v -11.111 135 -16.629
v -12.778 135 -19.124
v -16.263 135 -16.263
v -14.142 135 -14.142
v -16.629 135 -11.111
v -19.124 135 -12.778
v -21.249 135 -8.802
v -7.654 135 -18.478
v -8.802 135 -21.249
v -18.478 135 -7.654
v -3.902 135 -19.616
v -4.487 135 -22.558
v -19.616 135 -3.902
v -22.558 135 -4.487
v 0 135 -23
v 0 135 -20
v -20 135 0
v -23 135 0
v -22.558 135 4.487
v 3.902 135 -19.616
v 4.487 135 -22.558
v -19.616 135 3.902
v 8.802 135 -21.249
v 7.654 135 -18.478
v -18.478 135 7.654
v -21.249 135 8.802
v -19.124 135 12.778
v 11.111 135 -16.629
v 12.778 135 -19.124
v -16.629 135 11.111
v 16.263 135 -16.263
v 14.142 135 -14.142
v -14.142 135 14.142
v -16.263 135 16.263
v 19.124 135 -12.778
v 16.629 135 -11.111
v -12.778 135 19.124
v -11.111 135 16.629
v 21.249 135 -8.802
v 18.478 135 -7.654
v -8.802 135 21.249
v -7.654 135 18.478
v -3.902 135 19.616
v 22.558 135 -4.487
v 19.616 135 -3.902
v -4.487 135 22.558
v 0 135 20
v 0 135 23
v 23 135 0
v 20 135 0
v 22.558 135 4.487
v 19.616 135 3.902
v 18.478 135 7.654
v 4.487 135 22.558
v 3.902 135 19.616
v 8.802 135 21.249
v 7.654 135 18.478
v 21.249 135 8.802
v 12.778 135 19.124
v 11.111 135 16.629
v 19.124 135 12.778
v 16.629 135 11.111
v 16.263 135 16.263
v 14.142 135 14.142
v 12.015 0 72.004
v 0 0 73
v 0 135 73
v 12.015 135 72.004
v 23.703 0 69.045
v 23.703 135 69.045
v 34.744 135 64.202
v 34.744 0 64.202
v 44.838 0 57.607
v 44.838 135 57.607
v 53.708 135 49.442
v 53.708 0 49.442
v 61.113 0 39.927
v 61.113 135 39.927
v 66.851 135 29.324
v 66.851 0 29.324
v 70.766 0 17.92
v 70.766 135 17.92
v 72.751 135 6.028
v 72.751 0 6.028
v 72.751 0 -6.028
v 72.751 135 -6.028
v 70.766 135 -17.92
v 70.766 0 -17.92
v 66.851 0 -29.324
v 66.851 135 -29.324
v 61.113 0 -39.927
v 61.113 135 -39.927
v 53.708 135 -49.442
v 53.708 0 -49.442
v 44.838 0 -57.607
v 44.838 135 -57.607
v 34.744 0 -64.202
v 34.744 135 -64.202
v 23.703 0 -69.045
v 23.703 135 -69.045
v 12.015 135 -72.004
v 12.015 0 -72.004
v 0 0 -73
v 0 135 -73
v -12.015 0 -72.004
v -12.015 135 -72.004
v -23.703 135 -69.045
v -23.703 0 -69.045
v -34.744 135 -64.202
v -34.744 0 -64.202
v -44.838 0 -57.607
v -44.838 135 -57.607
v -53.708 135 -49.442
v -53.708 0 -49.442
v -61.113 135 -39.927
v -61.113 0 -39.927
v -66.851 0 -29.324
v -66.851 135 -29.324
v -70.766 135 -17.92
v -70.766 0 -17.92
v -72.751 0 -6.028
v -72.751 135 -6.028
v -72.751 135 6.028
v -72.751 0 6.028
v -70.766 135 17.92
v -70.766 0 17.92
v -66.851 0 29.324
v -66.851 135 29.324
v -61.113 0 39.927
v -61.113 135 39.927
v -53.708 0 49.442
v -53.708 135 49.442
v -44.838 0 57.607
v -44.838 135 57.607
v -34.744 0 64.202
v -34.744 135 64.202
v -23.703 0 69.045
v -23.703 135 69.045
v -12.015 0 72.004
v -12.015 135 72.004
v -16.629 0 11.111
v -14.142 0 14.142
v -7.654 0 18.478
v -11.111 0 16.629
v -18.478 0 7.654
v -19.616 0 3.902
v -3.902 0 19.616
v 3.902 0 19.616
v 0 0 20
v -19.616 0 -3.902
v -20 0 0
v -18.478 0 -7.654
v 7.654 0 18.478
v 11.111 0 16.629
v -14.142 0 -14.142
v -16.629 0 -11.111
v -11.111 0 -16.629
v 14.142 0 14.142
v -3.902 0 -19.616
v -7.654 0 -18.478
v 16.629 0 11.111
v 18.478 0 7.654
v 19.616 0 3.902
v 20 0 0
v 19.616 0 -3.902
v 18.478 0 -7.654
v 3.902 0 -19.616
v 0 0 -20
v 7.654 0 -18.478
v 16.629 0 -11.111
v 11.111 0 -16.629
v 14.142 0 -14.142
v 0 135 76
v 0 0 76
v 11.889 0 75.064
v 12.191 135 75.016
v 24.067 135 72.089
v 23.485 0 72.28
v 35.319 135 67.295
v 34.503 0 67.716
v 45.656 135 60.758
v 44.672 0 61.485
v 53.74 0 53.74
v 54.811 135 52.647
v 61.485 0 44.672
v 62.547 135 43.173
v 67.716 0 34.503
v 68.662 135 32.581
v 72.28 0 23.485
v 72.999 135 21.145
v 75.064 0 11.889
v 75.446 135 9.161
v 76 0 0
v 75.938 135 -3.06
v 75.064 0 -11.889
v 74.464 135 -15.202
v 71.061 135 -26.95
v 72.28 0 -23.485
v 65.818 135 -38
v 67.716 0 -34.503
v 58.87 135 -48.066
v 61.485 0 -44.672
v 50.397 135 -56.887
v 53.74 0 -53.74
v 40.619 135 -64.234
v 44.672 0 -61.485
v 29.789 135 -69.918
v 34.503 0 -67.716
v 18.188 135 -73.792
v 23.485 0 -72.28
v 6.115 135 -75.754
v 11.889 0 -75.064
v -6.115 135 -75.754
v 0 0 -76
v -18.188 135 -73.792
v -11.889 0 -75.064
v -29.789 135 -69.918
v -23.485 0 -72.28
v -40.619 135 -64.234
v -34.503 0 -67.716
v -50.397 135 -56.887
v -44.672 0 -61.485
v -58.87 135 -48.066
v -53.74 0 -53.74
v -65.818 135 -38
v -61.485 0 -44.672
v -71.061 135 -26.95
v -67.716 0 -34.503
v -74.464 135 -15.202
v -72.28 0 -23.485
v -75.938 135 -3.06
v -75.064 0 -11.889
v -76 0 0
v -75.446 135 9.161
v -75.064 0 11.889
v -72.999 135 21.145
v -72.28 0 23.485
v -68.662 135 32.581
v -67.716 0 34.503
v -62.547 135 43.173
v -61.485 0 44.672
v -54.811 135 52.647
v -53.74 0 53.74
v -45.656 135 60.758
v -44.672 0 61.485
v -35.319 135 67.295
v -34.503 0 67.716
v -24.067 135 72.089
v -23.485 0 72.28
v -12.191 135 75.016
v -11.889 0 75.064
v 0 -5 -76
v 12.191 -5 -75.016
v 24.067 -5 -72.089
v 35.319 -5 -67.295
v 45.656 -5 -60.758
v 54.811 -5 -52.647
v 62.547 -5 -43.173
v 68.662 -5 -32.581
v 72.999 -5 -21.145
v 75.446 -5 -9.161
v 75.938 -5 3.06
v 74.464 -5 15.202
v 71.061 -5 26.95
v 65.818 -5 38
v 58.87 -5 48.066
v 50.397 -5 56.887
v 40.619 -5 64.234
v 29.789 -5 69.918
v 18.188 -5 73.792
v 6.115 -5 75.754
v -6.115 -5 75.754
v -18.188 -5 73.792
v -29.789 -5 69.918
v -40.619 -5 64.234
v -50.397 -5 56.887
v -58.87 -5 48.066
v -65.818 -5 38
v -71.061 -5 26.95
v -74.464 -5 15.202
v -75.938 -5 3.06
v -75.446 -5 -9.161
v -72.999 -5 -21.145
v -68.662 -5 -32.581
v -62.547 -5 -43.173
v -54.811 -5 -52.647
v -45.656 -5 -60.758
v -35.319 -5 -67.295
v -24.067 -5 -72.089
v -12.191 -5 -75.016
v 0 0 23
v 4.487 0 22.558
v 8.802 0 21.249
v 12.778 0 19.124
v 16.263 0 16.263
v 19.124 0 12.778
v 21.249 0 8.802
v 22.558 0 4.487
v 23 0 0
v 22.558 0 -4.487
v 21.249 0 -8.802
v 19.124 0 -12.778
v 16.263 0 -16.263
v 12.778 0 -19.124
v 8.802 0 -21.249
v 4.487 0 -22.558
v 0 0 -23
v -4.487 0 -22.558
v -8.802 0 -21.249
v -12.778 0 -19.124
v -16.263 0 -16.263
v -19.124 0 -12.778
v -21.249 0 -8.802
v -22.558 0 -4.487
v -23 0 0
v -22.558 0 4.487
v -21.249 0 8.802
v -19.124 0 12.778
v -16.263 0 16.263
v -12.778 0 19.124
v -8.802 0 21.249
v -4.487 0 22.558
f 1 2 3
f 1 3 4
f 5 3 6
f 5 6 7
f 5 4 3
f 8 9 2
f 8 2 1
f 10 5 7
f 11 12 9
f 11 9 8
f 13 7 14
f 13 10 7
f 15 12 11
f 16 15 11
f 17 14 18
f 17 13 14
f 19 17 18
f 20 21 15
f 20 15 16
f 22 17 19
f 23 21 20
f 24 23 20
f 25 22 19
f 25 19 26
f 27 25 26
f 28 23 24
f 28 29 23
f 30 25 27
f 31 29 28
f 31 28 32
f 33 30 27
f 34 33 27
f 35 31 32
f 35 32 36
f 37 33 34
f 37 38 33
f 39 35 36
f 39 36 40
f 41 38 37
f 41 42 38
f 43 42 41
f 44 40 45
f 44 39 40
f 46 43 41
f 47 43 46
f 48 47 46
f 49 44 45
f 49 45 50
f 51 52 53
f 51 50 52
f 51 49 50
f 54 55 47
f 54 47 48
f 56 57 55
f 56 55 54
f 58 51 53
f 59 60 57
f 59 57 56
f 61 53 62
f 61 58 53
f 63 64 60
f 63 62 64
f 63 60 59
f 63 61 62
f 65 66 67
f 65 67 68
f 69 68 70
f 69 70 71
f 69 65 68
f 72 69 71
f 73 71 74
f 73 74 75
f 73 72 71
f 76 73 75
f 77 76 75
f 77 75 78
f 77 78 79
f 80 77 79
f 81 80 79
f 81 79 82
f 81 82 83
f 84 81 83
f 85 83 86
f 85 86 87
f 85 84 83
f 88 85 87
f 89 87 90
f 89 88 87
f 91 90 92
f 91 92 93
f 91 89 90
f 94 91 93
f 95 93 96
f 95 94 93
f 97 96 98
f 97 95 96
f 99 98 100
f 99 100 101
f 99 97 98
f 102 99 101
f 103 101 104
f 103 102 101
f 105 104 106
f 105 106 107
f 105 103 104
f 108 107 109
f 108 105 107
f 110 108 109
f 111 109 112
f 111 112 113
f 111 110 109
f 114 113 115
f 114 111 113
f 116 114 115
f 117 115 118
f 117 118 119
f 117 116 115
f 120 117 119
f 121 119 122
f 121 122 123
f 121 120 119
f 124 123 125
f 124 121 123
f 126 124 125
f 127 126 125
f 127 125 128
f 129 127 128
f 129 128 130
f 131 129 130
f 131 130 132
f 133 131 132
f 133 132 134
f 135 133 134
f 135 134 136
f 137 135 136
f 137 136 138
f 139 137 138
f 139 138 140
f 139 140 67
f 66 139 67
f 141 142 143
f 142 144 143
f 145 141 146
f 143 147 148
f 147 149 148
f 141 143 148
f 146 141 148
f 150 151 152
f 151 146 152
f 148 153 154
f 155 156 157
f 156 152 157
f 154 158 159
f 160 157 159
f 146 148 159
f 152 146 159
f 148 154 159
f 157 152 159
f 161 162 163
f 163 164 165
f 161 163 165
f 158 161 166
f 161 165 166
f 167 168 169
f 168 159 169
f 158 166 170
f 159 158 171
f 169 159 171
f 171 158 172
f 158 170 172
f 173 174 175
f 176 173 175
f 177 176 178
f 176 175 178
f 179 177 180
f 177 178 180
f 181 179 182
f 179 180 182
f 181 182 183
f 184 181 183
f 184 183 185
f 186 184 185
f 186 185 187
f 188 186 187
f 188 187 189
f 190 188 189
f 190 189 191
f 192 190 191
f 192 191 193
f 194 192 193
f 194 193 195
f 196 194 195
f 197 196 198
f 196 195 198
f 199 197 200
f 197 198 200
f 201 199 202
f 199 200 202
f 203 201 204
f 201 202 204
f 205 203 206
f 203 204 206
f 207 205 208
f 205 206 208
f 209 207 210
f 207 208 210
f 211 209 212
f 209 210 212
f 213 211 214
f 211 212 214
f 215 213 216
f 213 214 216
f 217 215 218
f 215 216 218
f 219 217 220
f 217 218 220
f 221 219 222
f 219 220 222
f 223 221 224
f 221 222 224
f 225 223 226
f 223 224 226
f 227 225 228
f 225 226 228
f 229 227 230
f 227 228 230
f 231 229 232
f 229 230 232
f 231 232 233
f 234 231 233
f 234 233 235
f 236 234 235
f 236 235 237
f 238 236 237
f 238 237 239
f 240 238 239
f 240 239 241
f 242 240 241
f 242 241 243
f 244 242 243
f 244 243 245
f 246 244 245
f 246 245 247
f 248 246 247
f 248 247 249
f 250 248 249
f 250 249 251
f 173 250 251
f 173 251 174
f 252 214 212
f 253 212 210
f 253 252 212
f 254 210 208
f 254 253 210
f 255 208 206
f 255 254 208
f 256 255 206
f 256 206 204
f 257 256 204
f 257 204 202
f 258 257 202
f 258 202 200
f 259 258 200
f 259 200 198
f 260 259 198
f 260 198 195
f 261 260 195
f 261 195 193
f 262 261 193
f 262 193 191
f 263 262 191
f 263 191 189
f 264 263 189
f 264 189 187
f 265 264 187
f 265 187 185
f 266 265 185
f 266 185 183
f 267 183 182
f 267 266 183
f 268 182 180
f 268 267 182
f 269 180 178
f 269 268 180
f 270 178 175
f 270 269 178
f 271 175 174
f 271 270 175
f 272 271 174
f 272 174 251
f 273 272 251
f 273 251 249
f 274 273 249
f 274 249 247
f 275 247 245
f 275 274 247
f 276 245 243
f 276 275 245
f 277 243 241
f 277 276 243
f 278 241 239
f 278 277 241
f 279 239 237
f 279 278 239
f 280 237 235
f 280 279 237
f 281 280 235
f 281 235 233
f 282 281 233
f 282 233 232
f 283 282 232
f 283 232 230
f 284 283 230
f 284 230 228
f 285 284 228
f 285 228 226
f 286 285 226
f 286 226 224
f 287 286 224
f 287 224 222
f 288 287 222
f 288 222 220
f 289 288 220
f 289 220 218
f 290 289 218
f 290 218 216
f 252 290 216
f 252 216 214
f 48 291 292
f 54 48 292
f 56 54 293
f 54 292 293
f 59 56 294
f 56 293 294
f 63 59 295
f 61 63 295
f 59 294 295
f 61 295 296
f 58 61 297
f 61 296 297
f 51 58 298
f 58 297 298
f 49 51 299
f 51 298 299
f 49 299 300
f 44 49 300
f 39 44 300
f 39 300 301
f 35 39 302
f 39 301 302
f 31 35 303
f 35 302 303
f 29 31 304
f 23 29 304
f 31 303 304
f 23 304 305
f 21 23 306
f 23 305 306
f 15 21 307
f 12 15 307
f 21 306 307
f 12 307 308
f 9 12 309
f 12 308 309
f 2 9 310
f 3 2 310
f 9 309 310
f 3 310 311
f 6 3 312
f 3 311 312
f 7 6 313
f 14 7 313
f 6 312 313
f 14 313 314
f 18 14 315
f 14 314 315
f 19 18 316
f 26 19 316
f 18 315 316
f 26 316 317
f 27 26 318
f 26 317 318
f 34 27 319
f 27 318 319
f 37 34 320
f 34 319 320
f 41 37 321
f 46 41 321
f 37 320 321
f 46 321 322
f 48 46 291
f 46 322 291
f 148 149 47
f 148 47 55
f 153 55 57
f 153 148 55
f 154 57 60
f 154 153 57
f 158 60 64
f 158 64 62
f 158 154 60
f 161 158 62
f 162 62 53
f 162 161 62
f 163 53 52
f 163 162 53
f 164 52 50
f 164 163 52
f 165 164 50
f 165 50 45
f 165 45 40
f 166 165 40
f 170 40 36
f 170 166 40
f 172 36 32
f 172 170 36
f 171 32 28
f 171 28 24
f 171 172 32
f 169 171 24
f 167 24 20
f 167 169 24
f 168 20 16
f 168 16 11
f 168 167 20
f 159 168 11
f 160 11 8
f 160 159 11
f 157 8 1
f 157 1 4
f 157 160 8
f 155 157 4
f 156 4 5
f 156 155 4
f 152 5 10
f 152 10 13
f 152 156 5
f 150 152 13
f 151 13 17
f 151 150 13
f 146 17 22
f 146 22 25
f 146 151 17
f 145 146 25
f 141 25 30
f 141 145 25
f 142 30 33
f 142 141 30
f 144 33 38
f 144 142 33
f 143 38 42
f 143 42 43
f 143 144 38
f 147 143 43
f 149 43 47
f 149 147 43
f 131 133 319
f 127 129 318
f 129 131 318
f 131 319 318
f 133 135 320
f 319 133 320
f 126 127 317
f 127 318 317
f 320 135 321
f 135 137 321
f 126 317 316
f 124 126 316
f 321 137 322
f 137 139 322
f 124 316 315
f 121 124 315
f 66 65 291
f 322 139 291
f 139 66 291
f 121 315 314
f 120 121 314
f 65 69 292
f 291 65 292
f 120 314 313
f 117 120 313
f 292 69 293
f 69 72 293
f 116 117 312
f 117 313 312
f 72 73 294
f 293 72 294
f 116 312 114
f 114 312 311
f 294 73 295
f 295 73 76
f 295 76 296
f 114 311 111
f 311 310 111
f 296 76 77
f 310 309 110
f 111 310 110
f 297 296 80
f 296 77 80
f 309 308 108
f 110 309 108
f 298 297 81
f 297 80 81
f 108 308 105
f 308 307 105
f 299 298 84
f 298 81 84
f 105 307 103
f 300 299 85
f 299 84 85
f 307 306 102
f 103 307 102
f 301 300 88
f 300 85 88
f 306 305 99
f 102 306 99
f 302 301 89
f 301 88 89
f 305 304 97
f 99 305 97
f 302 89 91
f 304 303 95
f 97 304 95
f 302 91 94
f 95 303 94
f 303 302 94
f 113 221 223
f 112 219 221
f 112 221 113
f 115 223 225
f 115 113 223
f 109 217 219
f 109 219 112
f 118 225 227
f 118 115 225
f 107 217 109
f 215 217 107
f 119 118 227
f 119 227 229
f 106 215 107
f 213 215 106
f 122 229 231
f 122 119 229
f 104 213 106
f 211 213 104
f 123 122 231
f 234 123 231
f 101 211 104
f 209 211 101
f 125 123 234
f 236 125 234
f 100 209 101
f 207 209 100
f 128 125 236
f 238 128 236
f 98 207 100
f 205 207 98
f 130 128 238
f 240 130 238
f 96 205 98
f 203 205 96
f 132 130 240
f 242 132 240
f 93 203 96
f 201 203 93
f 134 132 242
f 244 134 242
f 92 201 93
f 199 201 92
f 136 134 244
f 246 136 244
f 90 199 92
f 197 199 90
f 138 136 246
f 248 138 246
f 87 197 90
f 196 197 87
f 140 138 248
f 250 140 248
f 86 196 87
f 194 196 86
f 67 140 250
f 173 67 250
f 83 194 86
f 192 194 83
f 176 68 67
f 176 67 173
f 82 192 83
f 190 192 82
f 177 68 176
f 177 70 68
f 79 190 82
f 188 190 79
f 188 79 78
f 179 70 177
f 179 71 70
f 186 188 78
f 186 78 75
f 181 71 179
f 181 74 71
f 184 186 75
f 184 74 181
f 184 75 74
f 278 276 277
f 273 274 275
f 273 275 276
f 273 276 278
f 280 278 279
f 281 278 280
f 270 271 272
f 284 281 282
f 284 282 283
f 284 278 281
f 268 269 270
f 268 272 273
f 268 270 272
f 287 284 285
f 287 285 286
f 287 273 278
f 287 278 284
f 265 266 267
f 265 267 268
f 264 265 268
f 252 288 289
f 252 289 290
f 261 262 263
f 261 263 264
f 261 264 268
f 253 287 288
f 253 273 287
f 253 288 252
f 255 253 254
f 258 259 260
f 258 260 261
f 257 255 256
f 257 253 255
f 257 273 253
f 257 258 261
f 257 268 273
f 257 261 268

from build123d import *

# Parameters (mm, degrees)
SKETCH1_R             = 76
SKETCH1_R_2           = 73
BOSS_EXTRUDE3_DEPTH   = 135
SKETCH1_R_3           = 23
SKETCH1_R_4           = 20
BOSS_EXTRUDE3_2_DEPTH = 135
BOSS_EXTRUDE4_START   = 5
SKETCH2_R             = 76
BOSS_EXTRUDE4_DEPTH   = 5


with BuildPart() as part:
    # Sketch1 → Boss-Extrude3 (new body)
    with BuildSketch(Plane(origin=(0, 0, 0), x_dir=(1, 0, 0), z_dir=(0, 1, 0))):
        with Locations(Location((0, 0, 0), (0, 0, 270))):
            Circle(SKETCH1_R)
        with Locations(Location((0, 0, 0), (0, 0, 270))):
            Circle(SKETCH1_R_2, mode=Mode.SUBTRACT)
    extrude(amount=BOSS_EXTRUDE3_DEPTH)



with BuildPart() as body_2:
    # Sketch1 → Boss-Extrude3 2 (new body)
    with BuildSketch(Plane(origin=(0, 0, 0), x_dir=(1, 0, 0), z_dir=(0, 1, 0))):
        with Locations(Location((0, 0, 0), (0, 0, 270))):
            Circle(SKETCH1_R_3)
        with Locations(Location((0, 0, 0), (0, 0, 270))):
            Circle(SKETCH1_R_4, mode=Mode.SUBTRACT)
    extrude(amount=BOSS_EXTRUDE3_2_DEPTH)


with BuildPart() as part_1:
    add(part.part)

    add(body_2.part)  # Boss-Extrude4 merges body 2
    # Sketch2 → Boss-Extrude4 (add)
    with BuildSketch(Plane.XZ.offset(BOSS_EXTRUDE4_START)):
        with Locations(Location((0, 0, 0), (0, 0, 270))):
            Circle(SKETCH2_R)
    extrude(amount=-BOSS_EXTRUDE4_DEPTH)


solid = part_1.part
